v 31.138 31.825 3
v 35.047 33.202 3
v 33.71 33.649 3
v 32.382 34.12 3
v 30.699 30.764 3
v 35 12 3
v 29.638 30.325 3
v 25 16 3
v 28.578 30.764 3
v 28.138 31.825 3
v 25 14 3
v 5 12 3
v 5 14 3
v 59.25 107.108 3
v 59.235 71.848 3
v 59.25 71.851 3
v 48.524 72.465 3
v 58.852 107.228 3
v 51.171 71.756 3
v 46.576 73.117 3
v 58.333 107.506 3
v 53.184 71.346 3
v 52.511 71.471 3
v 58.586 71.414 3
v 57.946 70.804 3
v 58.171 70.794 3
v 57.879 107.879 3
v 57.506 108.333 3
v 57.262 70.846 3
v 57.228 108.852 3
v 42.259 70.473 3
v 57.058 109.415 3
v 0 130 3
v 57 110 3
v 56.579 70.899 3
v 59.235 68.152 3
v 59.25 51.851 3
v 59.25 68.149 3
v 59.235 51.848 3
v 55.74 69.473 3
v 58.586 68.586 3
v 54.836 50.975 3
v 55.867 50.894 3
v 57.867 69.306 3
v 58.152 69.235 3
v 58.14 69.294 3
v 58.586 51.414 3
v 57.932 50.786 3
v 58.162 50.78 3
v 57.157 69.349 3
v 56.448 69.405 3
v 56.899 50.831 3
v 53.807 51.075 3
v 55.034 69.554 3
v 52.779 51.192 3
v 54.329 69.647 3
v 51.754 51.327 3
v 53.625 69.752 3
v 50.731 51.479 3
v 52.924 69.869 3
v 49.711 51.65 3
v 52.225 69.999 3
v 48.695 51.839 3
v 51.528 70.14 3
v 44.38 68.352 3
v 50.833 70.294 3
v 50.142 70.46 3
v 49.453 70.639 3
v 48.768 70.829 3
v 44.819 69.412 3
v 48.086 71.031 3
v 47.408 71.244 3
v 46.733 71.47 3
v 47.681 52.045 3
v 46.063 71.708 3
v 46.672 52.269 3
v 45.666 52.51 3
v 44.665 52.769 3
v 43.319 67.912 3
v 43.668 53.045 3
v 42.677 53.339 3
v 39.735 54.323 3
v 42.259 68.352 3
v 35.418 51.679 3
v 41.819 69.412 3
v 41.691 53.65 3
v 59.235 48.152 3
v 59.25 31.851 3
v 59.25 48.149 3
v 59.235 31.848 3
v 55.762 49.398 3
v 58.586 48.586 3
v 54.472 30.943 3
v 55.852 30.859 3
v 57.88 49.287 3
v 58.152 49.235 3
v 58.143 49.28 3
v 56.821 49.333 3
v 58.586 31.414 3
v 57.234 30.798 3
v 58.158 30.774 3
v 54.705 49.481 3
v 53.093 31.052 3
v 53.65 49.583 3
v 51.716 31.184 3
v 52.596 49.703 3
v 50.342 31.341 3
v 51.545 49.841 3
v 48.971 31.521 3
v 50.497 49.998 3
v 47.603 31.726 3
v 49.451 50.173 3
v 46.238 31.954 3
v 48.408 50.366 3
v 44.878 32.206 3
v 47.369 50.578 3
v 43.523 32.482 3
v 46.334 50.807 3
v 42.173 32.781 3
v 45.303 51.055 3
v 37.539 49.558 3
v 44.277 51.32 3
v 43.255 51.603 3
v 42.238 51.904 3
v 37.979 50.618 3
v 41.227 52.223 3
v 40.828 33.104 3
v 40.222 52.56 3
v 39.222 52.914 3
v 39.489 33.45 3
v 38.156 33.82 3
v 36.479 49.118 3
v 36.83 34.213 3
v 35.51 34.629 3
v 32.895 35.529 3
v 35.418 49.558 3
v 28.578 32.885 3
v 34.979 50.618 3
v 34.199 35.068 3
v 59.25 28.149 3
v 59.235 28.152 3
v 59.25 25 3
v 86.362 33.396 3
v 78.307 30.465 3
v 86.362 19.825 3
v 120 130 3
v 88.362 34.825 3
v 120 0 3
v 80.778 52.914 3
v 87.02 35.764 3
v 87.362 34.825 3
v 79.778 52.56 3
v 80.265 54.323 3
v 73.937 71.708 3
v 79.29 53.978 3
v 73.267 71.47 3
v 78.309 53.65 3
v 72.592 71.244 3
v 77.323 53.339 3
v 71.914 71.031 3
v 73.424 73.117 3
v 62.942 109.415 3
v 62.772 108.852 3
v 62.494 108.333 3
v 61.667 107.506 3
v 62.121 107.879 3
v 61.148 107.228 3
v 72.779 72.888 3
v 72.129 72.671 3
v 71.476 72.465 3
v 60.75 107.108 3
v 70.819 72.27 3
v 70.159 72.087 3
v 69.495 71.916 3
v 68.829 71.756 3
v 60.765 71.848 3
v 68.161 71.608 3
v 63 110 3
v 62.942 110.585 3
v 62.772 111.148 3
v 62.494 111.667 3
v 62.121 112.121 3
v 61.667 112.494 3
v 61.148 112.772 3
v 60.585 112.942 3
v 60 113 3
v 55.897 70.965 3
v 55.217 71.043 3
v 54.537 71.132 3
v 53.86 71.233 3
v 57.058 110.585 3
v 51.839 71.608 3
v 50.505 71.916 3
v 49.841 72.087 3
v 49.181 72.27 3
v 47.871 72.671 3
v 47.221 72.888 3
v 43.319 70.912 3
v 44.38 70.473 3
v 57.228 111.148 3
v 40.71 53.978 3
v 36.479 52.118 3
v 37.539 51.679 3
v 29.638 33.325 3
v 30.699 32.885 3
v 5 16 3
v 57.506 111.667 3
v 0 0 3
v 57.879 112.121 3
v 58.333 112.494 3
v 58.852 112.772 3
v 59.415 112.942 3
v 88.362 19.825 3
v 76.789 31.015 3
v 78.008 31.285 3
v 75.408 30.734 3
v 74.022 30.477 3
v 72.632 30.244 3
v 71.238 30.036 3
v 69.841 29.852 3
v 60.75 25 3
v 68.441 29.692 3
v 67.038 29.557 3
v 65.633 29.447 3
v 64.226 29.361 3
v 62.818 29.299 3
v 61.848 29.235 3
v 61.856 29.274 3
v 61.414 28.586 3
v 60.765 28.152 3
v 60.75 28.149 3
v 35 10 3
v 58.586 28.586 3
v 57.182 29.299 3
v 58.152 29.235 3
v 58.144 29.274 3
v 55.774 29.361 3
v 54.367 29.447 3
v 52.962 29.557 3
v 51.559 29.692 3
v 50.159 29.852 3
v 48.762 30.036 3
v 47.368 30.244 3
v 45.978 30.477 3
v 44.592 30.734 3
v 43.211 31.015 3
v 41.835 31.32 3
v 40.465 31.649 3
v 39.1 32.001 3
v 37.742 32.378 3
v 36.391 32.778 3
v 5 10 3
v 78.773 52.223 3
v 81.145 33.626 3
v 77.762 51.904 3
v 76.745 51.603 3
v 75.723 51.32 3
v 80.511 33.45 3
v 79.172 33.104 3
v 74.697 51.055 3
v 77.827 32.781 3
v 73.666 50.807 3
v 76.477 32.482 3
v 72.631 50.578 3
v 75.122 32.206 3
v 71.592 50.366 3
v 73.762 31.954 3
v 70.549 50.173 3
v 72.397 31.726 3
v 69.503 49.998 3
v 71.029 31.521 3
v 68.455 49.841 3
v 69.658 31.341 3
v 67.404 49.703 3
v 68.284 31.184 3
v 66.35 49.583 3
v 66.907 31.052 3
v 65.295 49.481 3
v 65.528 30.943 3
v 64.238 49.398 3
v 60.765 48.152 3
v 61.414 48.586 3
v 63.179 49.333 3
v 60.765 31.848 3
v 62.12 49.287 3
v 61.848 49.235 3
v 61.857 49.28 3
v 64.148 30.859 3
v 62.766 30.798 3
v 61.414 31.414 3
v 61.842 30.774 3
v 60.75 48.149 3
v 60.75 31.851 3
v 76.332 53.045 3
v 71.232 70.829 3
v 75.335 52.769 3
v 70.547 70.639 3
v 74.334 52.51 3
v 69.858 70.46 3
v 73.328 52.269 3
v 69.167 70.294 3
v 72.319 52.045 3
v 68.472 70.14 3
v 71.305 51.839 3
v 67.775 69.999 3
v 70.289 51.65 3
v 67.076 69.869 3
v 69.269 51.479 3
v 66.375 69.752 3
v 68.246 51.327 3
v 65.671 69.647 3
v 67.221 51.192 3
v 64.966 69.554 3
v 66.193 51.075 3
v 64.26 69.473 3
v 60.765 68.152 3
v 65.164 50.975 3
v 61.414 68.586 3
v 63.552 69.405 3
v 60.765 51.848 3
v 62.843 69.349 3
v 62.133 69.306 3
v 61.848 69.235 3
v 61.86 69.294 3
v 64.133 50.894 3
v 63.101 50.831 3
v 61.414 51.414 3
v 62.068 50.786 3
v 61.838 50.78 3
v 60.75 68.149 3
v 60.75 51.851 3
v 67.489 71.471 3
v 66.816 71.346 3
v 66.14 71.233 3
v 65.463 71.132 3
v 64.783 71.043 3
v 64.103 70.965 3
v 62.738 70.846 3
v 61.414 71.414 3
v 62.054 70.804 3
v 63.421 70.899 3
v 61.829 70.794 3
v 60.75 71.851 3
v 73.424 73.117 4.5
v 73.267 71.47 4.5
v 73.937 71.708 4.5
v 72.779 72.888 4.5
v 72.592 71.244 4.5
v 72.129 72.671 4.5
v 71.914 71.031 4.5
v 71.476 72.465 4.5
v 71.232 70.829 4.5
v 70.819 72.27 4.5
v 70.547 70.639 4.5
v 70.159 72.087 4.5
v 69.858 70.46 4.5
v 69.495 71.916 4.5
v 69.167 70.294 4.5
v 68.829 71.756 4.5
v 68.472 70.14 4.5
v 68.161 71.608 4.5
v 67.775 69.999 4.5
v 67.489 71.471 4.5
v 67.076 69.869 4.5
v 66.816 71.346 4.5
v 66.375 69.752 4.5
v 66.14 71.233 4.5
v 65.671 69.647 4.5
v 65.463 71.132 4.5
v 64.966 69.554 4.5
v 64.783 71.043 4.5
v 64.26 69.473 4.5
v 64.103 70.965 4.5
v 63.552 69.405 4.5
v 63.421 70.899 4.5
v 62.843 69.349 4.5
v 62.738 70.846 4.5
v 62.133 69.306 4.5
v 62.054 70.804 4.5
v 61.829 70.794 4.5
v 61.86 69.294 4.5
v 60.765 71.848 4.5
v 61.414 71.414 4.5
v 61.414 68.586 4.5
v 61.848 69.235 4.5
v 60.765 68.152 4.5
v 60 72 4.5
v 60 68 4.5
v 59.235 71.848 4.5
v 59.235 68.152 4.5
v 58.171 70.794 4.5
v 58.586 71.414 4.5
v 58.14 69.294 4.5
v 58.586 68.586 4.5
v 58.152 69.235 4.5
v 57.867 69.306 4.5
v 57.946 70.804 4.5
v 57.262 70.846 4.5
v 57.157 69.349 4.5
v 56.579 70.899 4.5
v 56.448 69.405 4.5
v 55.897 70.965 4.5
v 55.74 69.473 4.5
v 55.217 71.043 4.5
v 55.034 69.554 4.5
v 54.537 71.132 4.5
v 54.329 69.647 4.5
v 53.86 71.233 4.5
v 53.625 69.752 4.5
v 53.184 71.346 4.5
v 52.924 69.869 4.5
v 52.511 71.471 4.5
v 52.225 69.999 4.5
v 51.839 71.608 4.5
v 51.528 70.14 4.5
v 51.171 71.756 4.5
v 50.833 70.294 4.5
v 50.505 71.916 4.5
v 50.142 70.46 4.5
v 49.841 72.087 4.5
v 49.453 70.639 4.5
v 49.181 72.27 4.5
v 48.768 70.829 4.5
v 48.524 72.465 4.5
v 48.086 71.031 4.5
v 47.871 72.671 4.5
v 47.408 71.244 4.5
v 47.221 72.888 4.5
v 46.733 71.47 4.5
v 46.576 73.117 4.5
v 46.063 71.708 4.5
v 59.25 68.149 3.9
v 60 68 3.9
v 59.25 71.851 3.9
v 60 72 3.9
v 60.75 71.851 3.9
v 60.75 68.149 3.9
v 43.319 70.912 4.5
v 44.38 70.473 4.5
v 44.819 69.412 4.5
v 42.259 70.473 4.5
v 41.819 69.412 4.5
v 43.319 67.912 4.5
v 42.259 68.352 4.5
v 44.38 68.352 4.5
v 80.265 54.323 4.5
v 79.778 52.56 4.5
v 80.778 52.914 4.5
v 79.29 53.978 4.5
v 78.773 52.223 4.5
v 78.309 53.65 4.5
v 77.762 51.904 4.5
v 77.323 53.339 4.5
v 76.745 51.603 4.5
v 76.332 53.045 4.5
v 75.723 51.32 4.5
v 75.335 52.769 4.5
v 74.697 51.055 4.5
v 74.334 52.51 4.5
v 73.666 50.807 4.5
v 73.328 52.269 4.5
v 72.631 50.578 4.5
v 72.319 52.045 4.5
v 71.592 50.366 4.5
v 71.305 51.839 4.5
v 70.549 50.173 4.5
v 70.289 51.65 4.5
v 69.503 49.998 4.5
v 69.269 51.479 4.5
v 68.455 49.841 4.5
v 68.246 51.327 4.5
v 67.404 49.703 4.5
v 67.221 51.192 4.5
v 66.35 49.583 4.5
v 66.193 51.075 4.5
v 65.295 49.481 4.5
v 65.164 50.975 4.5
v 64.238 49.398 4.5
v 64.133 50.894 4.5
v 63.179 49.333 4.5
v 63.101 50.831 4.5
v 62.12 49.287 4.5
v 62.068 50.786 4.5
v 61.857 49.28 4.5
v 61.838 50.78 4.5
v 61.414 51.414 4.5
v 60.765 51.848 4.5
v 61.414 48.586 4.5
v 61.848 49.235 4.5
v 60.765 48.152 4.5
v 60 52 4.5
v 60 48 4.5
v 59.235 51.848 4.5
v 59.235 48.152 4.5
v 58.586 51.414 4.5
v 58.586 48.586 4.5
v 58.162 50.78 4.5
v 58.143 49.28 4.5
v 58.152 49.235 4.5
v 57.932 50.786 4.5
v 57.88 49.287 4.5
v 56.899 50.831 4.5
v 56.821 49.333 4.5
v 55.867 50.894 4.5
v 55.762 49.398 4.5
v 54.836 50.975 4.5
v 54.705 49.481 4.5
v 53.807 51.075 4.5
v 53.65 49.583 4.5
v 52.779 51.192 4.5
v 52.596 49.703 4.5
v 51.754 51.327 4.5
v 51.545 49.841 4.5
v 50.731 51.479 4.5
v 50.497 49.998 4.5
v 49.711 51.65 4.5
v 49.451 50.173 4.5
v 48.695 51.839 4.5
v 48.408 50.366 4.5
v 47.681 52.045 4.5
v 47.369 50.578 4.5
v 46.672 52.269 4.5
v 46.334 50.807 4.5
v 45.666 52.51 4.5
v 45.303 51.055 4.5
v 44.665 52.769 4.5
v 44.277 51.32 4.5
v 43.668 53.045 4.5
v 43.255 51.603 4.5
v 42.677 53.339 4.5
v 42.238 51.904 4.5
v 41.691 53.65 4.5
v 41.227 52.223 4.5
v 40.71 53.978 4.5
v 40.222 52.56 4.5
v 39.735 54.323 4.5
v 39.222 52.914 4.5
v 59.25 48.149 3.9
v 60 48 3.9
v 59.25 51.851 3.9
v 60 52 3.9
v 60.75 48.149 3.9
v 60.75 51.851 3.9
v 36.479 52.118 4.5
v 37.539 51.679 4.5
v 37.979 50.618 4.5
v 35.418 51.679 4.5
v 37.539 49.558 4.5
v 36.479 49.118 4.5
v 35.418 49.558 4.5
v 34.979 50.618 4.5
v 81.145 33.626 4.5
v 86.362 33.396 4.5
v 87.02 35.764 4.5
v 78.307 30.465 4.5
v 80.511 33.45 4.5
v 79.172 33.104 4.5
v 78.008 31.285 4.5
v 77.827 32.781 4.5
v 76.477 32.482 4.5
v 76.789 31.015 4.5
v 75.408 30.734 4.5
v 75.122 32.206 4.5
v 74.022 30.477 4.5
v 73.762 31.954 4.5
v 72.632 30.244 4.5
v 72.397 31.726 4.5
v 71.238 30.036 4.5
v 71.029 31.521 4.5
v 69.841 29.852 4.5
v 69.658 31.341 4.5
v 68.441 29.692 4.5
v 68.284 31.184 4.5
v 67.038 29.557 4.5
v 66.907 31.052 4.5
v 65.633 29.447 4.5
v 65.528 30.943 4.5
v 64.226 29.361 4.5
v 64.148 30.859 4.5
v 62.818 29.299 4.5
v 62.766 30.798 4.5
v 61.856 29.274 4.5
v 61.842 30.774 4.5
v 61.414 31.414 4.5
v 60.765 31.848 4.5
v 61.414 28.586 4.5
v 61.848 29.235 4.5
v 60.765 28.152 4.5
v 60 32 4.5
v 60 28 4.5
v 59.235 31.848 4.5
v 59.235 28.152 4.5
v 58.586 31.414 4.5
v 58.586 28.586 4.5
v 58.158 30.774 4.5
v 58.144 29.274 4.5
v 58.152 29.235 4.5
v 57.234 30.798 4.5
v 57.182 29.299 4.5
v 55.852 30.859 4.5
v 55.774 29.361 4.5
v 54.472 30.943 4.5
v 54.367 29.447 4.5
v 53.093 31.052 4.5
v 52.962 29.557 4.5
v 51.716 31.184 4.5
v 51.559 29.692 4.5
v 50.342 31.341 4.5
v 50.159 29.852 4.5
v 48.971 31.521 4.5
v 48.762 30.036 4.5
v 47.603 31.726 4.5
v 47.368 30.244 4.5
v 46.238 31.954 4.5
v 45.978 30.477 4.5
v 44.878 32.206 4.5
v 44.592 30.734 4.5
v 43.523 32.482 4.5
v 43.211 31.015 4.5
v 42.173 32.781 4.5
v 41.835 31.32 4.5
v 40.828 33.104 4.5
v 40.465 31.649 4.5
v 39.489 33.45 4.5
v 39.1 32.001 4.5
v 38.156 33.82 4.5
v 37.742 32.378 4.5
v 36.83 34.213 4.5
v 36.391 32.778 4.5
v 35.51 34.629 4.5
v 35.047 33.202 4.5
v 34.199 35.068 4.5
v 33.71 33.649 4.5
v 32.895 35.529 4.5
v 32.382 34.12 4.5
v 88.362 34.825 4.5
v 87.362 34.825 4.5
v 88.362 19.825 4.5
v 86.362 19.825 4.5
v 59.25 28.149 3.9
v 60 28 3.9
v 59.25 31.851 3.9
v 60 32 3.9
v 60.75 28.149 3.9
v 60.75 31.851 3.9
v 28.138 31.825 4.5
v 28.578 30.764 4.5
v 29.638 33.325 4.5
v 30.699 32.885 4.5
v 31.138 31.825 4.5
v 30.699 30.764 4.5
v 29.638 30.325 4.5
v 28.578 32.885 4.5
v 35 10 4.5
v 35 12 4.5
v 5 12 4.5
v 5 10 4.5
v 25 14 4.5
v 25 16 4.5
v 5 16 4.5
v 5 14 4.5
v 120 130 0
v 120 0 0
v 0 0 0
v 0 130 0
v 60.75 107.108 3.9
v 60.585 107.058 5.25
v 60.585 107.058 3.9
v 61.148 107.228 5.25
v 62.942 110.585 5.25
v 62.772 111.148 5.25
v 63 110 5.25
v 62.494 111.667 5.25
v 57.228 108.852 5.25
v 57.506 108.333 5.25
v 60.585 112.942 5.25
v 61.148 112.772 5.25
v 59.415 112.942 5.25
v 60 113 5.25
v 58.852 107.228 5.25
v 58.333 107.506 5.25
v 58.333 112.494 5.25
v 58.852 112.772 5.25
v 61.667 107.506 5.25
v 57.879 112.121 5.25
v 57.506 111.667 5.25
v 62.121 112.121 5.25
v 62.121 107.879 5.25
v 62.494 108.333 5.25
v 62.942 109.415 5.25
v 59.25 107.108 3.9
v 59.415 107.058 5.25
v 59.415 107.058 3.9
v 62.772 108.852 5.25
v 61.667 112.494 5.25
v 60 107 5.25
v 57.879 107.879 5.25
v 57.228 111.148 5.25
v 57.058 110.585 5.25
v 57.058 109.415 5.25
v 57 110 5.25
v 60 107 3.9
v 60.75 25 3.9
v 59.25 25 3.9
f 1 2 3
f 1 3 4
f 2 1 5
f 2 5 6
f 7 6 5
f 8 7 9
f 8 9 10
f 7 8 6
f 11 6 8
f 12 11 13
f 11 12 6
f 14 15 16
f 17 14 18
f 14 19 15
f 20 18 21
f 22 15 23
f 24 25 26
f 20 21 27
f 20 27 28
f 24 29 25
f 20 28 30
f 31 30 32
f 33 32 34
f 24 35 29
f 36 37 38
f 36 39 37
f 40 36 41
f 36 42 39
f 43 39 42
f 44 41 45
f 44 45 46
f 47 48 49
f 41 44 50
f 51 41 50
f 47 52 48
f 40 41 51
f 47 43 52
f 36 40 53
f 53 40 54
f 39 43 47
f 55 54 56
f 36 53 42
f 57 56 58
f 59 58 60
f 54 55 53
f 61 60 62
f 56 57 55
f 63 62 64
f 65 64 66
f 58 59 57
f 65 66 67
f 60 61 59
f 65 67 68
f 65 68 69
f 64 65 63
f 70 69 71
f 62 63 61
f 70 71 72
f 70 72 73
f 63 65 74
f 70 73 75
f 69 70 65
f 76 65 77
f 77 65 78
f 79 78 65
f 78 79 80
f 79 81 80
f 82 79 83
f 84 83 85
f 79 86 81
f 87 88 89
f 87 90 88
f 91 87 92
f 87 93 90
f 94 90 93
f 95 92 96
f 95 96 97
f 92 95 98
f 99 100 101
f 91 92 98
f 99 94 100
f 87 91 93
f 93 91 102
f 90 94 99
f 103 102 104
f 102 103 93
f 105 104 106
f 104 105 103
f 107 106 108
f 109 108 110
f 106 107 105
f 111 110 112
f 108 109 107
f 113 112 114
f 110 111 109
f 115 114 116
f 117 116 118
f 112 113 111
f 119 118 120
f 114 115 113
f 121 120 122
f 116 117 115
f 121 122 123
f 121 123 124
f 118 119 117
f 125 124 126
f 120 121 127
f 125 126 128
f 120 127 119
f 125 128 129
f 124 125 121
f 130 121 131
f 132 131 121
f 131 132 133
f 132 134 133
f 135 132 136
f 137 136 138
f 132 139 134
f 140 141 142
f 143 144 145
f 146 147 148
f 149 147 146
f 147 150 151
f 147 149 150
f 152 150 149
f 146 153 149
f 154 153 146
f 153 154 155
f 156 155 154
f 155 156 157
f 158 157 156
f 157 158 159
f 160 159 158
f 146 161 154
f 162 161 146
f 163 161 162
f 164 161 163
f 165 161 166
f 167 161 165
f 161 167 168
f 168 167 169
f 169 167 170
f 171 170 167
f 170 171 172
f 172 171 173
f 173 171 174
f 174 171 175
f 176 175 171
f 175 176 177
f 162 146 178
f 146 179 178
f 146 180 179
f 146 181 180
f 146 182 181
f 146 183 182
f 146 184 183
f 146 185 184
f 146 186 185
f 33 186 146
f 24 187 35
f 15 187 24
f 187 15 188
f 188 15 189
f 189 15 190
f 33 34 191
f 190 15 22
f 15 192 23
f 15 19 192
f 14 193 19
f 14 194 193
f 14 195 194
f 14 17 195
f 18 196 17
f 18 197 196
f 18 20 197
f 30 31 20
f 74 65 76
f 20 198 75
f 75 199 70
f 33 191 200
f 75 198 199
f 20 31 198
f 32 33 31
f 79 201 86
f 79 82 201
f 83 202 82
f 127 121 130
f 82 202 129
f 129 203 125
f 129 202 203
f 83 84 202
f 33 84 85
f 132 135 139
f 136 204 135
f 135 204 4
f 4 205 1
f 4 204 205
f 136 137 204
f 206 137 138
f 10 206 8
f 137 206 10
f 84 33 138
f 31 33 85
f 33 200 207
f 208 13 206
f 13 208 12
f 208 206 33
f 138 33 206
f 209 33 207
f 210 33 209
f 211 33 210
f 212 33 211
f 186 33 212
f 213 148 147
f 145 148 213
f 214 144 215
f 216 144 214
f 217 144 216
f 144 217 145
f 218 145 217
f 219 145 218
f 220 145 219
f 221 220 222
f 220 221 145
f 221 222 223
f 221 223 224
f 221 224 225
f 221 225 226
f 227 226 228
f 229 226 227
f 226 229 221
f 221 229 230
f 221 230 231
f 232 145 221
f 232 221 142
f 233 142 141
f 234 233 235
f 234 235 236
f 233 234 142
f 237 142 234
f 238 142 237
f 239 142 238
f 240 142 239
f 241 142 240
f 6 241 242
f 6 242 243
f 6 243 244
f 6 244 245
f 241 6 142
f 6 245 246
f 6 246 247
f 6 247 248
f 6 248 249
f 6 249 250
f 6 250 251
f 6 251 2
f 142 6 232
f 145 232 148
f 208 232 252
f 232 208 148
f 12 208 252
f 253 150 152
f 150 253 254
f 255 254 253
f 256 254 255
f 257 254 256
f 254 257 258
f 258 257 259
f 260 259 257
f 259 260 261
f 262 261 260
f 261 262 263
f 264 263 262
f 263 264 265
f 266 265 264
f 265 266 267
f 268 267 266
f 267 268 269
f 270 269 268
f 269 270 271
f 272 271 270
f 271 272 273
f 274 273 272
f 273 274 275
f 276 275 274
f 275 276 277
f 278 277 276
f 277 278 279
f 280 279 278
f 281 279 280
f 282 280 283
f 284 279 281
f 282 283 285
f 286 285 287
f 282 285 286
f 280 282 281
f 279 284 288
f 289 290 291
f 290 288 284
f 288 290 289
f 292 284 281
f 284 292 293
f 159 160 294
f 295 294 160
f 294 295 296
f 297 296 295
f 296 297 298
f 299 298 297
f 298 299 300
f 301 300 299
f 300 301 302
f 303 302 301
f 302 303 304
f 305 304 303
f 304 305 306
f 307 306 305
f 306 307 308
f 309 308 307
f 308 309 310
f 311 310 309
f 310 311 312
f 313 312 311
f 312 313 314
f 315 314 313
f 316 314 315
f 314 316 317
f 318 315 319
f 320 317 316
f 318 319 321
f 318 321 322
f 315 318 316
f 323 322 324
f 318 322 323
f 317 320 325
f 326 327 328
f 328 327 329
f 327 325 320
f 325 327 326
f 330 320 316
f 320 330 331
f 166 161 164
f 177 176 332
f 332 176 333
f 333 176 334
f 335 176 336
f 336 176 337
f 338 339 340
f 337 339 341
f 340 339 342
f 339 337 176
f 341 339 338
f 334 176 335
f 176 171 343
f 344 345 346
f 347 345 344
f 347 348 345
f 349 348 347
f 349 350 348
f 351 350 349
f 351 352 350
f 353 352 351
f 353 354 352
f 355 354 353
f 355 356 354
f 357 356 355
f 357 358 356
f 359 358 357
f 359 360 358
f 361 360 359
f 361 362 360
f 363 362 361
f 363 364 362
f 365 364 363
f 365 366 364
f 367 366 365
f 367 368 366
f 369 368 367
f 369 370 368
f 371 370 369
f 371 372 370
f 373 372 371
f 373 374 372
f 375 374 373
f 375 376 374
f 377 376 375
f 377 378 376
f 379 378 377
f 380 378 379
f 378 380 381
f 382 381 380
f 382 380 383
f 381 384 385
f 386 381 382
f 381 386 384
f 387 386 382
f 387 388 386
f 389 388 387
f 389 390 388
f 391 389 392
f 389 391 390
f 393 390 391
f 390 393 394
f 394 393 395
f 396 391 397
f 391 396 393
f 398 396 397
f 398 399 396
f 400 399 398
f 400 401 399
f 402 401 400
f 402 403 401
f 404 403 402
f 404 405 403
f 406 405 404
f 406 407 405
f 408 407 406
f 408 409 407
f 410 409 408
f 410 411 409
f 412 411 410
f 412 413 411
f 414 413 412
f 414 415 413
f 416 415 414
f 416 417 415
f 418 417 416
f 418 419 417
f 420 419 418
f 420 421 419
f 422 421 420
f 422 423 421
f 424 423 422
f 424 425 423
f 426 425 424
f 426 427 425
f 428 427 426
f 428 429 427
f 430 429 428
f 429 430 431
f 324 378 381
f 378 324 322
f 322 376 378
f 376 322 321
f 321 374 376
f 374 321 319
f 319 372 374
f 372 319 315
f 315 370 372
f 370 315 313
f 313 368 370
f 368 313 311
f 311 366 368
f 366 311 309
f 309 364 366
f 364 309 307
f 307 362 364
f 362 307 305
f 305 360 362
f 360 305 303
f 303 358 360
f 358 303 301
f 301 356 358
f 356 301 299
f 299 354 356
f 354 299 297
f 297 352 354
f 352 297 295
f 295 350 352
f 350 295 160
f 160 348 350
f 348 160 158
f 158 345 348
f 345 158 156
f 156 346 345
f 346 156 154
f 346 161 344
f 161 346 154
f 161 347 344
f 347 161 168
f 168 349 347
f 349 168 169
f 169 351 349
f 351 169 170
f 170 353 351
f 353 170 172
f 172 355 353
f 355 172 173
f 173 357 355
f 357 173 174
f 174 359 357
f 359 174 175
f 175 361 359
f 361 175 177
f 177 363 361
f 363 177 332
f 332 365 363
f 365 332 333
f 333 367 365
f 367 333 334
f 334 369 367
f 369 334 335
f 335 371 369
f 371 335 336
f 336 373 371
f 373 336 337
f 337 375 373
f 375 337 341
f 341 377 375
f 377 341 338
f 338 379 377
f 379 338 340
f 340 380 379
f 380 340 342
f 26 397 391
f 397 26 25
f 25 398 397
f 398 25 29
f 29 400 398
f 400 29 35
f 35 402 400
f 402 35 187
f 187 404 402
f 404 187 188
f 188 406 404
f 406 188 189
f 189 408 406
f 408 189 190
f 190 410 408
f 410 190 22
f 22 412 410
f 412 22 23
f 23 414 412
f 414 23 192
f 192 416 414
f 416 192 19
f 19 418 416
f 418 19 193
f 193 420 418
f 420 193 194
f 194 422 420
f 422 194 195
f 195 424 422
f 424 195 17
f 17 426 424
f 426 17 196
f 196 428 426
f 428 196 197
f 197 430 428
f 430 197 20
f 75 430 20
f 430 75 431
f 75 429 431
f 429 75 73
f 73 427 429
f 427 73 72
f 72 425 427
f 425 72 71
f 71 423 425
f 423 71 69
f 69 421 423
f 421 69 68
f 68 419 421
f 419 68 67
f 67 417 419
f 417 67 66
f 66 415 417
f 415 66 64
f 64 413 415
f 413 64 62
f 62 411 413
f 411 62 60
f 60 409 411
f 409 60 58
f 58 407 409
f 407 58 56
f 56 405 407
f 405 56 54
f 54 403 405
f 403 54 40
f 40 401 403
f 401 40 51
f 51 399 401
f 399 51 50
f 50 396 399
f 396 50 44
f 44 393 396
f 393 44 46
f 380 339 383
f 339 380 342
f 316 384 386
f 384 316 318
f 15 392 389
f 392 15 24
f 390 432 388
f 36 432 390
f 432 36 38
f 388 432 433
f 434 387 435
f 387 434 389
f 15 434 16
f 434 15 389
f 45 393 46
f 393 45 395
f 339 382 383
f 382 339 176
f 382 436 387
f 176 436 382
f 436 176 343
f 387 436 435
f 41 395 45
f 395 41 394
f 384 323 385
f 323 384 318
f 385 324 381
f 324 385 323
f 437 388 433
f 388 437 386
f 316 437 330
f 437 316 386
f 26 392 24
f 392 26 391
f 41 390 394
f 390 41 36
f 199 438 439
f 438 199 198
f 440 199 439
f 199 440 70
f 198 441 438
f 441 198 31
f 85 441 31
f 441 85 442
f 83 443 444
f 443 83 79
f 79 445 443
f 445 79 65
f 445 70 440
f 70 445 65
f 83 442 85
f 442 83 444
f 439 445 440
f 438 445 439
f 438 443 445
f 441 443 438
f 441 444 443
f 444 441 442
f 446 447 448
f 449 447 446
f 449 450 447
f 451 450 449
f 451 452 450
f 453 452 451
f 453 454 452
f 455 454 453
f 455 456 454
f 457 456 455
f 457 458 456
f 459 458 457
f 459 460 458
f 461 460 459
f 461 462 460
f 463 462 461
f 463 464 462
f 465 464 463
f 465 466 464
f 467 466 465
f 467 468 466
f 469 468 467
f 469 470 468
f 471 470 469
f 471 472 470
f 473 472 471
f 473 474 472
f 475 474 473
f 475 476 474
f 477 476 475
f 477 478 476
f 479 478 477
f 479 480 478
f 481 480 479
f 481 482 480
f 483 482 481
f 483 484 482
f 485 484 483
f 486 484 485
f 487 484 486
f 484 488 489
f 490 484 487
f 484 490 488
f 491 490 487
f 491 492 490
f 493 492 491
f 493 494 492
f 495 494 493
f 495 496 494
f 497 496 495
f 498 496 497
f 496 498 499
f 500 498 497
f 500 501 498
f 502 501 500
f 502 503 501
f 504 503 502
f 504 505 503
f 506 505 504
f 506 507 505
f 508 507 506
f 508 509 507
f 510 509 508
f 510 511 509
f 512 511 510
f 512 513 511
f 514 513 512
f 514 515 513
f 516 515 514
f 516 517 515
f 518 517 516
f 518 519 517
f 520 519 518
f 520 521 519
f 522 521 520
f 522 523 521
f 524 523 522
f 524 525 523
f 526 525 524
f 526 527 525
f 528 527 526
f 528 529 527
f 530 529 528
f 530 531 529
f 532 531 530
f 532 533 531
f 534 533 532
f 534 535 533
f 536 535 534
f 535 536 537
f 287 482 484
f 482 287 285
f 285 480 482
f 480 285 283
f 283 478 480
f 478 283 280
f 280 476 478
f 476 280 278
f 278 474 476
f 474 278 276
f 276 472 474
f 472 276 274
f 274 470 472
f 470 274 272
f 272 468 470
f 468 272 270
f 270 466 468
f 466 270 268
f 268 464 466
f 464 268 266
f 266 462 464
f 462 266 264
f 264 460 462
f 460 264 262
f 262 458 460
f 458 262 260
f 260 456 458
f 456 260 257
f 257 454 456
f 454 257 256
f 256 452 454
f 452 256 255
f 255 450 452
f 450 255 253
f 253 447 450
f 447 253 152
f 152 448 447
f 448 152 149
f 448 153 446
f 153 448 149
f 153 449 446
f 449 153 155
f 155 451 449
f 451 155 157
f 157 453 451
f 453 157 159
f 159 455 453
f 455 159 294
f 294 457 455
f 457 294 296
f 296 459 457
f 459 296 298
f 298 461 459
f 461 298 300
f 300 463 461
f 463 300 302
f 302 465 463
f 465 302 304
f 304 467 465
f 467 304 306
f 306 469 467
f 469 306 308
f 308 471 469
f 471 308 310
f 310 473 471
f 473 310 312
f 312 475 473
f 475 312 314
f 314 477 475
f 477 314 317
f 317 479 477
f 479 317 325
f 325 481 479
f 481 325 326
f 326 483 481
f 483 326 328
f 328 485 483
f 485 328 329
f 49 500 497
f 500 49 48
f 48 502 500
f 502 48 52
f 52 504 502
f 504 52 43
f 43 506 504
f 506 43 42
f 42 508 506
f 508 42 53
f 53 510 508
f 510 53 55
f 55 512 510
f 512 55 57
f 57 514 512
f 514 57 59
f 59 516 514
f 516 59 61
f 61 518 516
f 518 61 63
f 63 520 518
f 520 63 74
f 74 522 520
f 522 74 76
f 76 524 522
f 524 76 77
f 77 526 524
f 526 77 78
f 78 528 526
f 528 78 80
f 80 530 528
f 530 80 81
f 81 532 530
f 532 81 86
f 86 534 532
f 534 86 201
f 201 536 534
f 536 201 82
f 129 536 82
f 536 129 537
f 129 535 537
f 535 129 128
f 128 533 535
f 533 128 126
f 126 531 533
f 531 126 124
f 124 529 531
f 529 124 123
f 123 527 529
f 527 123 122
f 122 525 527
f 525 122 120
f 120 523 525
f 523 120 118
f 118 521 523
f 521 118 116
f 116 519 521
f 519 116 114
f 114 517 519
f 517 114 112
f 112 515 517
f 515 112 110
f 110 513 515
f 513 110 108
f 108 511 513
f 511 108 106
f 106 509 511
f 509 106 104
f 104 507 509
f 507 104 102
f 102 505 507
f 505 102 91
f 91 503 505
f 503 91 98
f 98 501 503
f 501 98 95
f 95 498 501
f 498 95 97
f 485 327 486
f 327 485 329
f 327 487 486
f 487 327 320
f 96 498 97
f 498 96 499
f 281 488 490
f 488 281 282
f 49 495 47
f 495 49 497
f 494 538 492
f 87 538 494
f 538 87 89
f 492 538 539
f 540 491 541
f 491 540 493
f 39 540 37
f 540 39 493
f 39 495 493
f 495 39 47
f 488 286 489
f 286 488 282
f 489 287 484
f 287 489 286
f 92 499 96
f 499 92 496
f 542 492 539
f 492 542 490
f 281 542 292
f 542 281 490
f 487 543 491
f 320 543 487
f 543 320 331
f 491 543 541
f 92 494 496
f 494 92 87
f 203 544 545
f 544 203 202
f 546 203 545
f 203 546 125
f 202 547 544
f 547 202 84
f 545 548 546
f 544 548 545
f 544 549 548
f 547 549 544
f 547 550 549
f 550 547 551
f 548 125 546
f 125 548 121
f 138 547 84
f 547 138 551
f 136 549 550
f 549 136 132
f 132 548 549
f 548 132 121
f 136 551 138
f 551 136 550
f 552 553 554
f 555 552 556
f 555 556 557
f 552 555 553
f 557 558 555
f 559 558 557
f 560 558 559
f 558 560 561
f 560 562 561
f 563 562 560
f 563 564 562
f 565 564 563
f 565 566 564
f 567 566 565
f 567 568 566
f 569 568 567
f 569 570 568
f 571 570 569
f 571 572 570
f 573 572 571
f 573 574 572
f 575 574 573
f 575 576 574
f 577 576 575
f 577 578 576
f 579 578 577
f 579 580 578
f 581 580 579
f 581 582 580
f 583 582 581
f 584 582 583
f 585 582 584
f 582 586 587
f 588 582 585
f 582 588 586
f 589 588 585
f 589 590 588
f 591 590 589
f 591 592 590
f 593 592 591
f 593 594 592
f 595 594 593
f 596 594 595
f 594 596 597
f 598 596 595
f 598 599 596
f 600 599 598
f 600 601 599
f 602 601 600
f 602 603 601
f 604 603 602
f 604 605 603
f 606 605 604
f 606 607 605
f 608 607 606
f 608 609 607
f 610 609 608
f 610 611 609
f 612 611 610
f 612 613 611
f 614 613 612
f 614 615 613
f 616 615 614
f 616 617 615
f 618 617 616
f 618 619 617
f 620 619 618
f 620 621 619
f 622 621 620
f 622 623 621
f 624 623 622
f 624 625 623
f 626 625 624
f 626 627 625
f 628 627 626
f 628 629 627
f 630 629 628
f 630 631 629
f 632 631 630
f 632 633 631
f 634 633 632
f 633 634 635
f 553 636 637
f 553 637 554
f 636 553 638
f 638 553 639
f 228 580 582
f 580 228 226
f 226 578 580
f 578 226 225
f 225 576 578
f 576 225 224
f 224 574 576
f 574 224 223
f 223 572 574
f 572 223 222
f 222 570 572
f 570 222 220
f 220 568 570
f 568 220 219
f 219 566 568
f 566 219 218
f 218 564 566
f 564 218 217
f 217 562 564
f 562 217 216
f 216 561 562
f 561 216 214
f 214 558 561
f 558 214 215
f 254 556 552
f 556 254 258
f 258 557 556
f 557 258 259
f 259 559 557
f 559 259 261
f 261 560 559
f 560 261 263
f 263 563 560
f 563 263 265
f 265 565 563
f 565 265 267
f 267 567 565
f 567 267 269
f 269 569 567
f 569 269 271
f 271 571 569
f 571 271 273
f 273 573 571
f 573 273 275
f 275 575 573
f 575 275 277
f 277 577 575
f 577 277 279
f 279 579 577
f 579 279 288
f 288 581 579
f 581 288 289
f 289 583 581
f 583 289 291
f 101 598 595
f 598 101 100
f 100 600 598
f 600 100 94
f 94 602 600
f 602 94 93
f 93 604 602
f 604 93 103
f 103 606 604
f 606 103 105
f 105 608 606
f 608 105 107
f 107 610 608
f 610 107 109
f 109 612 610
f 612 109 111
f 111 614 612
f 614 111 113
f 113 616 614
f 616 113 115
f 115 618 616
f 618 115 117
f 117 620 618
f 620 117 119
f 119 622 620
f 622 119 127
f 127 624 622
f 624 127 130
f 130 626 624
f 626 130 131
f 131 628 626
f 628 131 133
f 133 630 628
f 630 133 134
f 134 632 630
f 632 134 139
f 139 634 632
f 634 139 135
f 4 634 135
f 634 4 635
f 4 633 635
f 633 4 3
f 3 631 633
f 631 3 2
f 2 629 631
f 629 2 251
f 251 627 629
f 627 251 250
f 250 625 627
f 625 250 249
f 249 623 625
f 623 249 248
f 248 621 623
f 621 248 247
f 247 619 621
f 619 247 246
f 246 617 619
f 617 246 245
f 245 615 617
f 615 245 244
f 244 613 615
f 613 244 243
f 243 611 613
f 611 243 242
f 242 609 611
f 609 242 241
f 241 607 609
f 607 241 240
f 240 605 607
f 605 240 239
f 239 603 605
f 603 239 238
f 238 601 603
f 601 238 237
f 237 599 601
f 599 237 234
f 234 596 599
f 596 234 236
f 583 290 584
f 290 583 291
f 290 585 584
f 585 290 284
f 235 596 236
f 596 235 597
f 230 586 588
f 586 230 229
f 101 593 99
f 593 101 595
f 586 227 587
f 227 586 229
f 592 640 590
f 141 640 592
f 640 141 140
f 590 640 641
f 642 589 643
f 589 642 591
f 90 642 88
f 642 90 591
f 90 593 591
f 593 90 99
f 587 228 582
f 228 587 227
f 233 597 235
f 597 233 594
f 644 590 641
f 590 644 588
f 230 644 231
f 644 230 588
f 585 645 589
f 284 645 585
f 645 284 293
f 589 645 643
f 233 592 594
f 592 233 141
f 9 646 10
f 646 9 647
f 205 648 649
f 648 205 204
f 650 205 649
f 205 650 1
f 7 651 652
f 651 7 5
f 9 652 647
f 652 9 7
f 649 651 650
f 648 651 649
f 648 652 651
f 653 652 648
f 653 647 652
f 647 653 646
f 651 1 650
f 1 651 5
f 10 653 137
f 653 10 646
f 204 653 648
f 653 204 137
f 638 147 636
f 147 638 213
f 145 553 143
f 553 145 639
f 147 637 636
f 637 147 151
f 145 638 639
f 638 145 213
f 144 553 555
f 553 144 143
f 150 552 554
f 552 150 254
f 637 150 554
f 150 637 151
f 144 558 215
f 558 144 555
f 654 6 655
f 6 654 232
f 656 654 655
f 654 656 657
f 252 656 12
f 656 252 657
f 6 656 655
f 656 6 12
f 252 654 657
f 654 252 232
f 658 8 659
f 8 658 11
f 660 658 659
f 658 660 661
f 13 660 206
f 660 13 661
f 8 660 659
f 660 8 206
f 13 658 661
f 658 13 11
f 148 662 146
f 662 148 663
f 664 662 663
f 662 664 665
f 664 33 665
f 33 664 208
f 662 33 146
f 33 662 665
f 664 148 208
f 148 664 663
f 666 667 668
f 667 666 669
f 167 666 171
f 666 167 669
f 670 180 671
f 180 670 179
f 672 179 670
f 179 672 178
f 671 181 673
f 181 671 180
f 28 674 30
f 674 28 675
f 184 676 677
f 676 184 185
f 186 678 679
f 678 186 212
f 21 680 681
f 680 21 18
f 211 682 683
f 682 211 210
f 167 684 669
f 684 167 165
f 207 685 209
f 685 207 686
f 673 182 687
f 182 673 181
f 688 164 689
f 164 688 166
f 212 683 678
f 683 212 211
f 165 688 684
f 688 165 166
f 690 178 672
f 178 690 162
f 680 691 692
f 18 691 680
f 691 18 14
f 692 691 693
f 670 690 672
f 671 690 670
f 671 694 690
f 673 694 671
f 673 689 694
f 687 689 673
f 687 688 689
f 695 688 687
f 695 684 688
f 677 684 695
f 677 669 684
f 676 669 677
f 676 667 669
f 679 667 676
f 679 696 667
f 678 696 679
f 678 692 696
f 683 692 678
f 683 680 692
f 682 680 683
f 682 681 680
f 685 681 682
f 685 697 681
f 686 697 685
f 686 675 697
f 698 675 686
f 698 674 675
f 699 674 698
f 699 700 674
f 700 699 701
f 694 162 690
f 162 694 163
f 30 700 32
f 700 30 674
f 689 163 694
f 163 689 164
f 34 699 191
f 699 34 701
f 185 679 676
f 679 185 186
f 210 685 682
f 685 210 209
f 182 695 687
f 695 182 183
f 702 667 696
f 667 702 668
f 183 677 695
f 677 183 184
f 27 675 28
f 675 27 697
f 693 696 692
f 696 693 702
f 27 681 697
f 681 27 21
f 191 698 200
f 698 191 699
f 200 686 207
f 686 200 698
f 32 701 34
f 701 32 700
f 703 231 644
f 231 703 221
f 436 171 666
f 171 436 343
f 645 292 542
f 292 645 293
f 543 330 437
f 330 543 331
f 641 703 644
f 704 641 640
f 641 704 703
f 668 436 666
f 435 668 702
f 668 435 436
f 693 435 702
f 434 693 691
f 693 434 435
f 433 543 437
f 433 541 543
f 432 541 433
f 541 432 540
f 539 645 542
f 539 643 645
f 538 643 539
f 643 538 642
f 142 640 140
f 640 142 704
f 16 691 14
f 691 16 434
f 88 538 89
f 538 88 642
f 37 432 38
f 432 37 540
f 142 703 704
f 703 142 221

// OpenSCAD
/*
 * Title: Pendulum Geometry Guide Board
 * Folder: 16_oscillations_shm
 * Physics Topic: Simple Pendulum, Restoring Force, Period vs Length
 * Difficulty: Beginner
 * Print Type: flat
 * Teaches: T=2π√(L/g), restoring force F=-mgsinθ, period independent of mass
 * Use Case: Classroom reference board; compare arc lengths for three pendulum lengths
 */

// --------------------
// Parameters
// --------------------
board_width          = 120;   // mm
board_height         = 130;   // mm
board_thickness      = 3;     // mm
pivot_height         = 110;   // mm from board bottom — pivot point y position
pendulum_lengths     = [40, 60, 80];  // mm — three pendulum lengths displayed
swing_angle          = 20;    // degrees — max swing angle from vertical
show_period_labels   = true;  // raised ratio markers "T∝√L"
show_force_components = true; // force decomposition arrows on longest pendulum
show_equilibrium_line = true; // vertical line from pivot downward

// --------------------
// Physics Meaning
// --------------------
// Period of a simple pendulum: T = 2π · √(L/g)
// T depends ONLY on length L and g — not on mass or amplitude (small angles).
// Restoring force: F_tang = −mg · sin(θ) ≈ −mg · θ  (small angle approximation)
// The tangential component of gravity pulls the bob back toward equilibrium.

// --------------------
// Learning Notes
// --------------------
// - Doubling L multiplies T by √2 ≈ 1.41
// - The three arcs show visually that longer pendulums swing through larger paths
// - Force components: gravity (down), tension (along string), restoring (tangential)
// - At equilibrium: restoring force = 0; at max angle: restoring force = max

// --------------------
// Print Notes
// --------------------
// - Print flat; no supports needed
// - 0.2 mm layer height for clean arc curves
// - PLA at 15% infill

// --------------------
// Customization Ideas
// --------------------
// - Change pendulum_lengths to [30, 60, 120] for a cleaner 1:√2:2 period ratio
// - Increase swing_angle to 35° to discuss small-angle approximation limits
// - Add a fourth pendulum for a double-length comparison

$fn = 64;

feature_h    = 1.5;   // mm raised features height
arc_w        = 1.5;   // mm arc line width
dot_d        = 6;     // mm pivot dot diameter
arrow_w      = 2;     // mm force arrow width
pivot_x      = board_width / 2;
pivot_y      = pivot_height;

// --------------------
// Board base
// --------------------
module board_base() {
  cube([board_width, board_height, board_thickness]);
}

// --------------------
// Pivot dot
// --------------------
module pivot_dot() {
  translate([pivot_x, pivot_y, board_thickness])
    cylinder(h=feature_h * 1.5, d=dot_d, $fn=32);
}

// --------------------
// Equilibrium line (vertical from pivot downward)
// --------------------
module equilibrium_line() {
  longest = pendulum_lengths[len(pendulum_lengths)-1];
  translate([pivot_x - arc_w/2, pivot_y - longest - 5, board_thickness])
    cube([arc_w, longest + 5, feature_h * 0.6]);
}

// --------------------
// Single pendulum arc
// --------------------
module pendulum_arc(length, label_id) {
  n_pts    = 40;
  half_pts = n_pts / 2;

  // Outer arc points
  outer_pts = [for (i = [0 : n_pts])
    let(ang = -swing_angle + i * (2 * swing_angle) / n_pts)
    [(pivot_x + (length + arc_w/2) * sin(ang)),
     (pivot_y - (length + arc_w/2) * cos(ang))]
  ];

  // Inner arc points (reversed for polygon winding)
  inner_pts = [for (i = [n_pts : -1 : 0])
    let(ang = -swing_angle + i * (2 * swing_angle) / n_pts)
    [(pivot_x + (length - arc_w/2) * sin(ang)),
     (pivot_y - (length - arc_w/2) * cos(ang))]
  ];

  all_pts = concat(outer_pts, inner_pts);

  translate([0, 0, board_thickness])
    linear_extrude(height = feature_h)
      polygon(all_pts);

  // Bob dot at center (equilibrium bottom)
  translate([pivot_x, pivot_y - length, board_thickness])
    cylinder(h=feature_h, d=4, $fn=16);

  // Label tick at left extreme of arc
  lx = pivot_x + length * sin(-swing_angle);
  ly = pivot_y - length * cos(swing_angle);
  translate([lx - 3, ly - 3, board_thickness])
    cylinder(h=feature_h, d=3, $fn=8);
}

// --------------------
// Force component arrows on the longest pendulum
// --------------------
module force_components() {
  length  = pendulum_lengths[len(pendulum_lengths)-1];
  ang     = swing_angle;
  bob_x   = pivot_x + length * sin(ang);
  bob_y   = pivot_y - length * cos(ang);
  g_len   = 15;  // gravity arrow length
  t_len   = 10;  // tangential component length

  translate([0, 0, board_thickness]) {
    // Gravity arrow (straight down)
    translate([bob_x - arrow_w/2, bob_y - g_len, 0])
      cube([arrow_w, g_len, feature_h]);
    // Tangential component (perpendicular to string, pointing toward equilibrium)
    rotate_about = [bob_x, bob_y, 0];
    translate([bob_x, bob_y, 0])
      rotate([0, 0, -(90 - ang)])
        translate([-arrow_w/2, -t_len, 0])
          cube([arrow_w, t_len, feature_h]);
  }
}

// --------------------
// Period ratio label bar
// --------------------
module period_label_bar() {
  // Raised horizontal bar as "T∝√L" placeholder label
  translate([5, 10, board_thickness])
    cube([30, 2, feature_h]);
  translate([5, 14, board_thickness])
    cube([20, 2, feature_h]);
}

// --------------------
// pendulum_guide() — main model
// --------------------
module pendulum_guide() {
  union() {
    board_base();
    pivot_dot();
    if (show_equilibrium_line) equilibrium_line();
    for (i = [0 : len(pendulum_lengths) - 1]) {
      pendulum_arc(pendulum_lengths[i], i);
    }
    if (show_force_components) force_components();
    if (show_period_labels)    period_label_bar();
  }
}

// --------------------
// demo_default()
// --------------------
module demo_default() {
  pendulum_guide();
}

// --------------------
// demo_single_pendulum(length_mm)
// --------------------
module demo_single_pendulum(length_mm=60) {
  board_base();
  pivot_dot();
  if (show_equilibrium_line) equilibrium_line();
  pendulum_arc(length_mm, 0);
}

// Run default demo
demo_default();
